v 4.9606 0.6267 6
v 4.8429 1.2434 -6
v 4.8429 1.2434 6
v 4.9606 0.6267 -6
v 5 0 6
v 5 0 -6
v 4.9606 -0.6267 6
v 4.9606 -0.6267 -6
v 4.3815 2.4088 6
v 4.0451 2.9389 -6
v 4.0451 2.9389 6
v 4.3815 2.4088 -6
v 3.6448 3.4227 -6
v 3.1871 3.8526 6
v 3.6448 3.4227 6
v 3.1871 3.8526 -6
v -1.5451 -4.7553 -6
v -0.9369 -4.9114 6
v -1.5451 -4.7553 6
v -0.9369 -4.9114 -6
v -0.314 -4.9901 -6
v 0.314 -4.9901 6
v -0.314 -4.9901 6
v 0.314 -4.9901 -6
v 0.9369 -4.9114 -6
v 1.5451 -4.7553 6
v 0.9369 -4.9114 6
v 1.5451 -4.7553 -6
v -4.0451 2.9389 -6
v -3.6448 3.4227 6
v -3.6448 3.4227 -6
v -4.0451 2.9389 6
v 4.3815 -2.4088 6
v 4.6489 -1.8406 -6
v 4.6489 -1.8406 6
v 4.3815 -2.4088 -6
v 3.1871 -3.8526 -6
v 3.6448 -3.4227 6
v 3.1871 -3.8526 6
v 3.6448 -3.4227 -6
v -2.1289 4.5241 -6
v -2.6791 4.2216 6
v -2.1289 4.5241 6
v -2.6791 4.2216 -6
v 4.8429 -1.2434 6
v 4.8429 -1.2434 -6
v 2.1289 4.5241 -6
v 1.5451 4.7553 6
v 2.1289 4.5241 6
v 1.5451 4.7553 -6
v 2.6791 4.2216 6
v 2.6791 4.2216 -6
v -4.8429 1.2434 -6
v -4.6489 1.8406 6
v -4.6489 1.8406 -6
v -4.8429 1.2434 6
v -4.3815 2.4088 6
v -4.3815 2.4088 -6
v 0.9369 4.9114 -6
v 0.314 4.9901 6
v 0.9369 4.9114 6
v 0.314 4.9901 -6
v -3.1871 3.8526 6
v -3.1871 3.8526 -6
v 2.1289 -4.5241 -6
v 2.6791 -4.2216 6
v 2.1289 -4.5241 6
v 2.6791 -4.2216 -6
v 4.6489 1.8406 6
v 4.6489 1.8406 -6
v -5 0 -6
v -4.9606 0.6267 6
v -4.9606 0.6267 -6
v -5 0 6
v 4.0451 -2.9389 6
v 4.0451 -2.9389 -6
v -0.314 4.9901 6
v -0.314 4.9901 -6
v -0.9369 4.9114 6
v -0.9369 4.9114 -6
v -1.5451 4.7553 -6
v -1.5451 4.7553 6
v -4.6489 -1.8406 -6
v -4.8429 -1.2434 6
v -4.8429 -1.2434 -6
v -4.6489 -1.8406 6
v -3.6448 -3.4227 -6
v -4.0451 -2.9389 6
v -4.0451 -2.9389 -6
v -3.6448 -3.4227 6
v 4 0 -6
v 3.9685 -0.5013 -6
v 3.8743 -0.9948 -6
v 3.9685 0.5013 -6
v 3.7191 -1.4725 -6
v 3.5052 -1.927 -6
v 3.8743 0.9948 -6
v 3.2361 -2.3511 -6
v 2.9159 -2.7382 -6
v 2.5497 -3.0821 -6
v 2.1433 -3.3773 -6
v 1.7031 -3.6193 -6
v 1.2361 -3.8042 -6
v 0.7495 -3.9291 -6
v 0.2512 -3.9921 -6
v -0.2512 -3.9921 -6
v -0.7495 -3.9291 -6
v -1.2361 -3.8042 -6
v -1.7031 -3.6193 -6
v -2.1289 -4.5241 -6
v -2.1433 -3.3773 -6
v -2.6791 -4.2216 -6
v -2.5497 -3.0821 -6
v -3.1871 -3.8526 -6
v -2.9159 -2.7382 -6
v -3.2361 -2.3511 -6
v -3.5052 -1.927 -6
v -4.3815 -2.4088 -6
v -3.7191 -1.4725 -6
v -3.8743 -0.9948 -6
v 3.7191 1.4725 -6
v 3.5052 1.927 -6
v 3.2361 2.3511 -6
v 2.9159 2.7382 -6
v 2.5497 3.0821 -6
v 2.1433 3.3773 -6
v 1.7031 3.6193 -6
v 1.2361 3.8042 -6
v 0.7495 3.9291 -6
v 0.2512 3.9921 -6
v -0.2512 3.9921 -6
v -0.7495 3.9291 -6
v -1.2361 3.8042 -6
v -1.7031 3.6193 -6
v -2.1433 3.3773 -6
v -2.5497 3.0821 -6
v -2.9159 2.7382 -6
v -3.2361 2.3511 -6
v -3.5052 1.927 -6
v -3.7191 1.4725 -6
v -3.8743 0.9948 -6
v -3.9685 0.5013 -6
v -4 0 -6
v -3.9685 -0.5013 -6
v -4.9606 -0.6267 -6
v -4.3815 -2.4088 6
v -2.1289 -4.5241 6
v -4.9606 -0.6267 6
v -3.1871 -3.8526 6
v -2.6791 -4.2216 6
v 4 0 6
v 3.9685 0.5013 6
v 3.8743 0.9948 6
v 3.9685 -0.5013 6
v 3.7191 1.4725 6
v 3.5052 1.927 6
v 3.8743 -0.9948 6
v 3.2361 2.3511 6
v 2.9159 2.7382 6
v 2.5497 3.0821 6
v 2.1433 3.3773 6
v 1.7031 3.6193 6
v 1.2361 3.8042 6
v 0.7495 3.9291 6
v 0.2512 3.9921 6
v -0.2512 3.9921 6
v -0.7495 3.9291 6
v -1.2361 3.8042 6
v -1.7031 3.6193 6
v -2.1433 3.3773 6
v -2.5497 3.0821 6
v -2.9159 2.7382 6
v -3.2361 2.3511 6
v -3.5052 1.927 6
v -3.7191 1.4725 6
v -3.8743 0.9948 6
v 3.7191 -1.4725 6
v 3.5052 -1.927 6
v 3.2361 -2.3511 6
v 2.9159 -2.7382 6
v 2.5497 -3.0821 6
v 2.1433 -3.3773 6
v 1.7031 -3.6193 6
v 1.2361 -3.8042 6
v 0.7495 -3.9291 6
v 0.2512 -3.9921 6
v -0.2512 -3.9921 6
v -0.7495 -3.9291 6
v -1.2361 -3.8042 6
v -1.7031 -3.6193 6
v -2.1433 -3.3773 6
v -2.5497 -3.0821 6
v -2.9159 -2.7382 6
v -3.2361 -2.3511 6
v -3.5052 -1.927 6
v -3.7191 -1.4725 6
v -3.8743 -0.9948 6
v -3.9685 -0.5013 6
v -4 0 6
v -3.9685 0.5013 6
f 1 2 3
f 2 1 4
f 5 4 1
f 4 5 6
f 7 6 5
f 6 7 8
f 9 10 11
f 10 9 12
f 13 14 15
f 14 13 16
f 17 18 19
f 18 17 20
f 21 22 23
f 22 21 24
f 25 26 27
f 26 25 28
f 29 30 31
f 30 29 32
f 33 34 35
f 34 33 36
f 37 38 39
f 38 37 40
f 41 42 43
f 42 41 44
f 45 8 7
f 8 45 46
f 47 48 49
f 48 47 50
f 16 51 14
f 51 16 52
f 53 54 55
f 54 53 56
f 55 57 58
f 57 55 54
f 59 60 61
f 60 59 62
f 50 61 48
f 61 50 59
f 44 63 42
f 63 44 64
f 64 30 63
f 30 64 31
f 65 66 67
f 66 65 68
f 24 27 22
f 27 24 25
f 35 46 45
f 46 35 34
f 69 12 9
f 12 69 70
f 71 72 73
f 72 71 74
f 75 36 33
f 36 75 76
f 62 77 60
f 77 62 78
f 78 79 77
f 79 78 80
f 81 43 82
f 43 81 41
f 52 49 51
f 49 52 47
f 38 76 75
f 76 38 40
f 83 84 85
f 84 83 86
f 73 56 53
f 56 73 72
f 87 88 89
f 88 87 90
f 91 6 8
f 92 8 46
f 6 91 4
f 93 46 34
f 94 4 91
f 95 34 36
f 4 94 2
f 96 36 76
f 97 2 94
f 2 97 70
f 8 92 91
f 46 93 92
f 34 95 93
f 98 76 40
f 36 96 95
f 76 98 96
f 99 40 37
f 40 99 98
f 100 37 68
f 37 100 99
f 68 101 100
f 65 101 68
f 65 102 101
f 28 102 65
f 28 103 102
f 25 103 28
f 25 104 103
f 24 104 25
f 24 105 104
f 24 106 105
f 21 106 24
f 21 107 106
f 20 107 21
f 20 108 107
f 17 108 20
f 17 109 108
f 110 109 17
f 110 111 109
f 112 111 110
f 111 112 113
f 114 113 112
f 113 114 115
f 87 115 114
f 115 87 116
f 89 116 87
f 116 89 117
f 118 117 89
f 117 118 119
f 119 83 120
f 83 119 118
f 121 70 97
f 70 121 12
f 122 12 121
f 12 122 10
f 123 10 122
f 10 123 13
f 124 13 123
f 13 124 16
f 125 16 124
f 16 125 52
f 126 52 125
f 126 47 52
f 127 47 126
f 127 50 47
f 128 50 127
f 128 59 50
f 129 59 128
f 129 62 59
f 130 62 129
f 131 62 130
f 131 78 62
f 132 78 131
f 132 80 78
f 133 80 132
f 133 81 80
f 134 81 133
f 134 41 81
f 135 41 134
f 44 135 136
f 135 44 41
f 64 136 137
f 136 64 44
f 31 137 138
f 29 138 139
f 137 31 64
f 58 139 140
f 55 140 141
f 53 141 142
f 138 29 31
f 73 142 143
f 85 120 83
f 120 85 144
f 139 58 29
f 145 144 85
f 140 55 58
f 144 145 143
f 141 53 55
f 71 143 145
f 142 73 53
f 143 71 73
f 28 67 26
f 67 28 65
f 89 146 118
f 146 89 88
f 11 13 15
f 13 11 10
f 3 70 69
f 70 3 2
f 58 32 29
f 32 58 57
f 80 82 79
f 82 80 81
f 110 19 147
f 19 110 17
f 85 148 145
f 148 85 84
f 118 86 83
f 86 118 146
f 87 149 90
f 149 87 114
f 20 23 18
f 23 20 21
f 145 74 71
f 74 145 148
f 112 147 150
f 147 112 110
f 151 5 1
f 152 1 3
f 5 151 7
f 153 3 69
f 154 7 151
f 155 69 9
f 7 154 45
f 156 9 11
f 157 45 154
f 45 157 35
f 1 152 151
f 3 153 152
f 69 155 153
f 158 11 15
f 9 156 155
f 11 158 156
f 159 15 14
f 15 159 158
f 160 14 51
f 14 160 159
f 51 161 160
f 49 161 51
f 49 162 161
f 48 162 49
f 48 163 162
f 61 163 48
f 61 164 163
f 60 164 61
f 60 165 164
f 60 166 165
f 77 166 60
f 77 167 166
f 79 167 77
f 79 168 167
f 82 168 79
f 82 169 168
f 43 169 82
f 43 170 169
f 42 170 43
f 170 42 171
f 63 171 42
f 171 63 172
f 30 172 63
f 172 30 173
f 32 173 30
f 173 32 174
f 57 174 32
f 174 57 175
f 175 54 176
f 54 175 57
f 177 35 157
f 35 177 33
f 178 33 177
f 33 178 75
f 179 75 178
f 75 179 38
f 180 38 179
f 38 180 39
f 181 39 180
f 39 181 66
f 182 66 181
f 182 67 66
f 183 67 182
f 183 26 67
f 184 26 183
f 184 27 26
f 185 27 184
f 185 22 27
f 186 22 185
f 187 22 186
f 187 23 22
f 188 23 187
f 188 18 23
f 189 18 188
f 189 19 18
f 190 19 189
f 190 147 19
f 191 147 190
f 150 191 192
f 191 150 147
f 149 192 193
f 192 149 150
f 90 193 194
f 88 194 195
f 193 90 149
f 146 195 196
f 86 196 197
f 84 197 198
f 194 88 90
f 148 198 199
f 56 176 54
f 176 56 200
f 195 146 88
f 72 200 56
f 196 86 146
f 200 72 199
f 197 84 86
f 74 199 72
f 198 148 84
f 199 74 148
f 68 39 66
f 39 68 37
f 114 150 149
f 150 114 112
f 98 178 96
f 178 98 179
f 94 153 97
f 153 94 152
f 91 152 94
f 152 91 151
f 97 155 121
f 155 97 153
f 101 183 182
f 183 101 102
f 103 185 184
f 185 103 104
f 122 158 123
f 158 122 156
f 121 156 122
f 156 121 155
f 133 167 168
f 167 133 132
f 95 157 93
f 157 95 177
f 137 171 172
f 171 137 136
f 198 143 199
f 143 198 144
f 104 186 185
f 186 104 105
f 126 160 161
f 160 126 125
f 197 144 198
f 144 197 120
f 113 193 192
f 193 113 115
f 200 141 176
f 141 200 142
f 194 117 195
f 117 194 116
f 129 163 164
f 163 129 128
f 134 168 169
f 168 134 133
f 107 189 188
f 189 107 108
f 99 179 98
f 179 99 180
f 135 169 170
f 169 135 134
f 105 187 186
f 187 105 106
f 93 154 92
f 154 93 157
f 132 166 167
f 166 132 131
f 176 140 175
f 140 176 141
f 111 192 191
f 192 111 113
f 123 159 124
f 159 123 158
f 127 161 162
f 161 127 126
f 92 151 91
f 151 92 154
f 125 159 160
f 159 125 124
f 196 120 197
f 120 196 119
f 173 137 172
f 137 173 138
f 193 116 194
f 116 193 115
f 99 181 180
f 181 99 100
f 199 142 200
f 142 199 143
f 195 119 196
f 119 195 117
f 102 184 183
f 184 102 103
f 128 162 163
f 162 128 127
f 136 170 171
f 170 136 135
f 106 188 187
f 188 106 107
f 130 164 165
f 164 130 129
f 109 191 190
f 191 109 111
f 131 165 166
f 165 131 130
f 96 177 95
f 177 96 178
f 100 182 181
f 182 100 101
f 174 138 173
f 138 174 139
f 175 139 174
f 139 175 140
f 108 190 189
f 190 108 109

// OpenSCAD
$fn = 50;


difference() {
	union() {
		translate(v = [0, 0, -6.0000000000]) {
			cylinder(h = 12, r = 5.0000000000);
		}
	}
	union() {
		translate(v = [0, 0, -100.0000000000]) {
			cylinder(h = 200, r = 4.0000000000);
		}
	}
}
